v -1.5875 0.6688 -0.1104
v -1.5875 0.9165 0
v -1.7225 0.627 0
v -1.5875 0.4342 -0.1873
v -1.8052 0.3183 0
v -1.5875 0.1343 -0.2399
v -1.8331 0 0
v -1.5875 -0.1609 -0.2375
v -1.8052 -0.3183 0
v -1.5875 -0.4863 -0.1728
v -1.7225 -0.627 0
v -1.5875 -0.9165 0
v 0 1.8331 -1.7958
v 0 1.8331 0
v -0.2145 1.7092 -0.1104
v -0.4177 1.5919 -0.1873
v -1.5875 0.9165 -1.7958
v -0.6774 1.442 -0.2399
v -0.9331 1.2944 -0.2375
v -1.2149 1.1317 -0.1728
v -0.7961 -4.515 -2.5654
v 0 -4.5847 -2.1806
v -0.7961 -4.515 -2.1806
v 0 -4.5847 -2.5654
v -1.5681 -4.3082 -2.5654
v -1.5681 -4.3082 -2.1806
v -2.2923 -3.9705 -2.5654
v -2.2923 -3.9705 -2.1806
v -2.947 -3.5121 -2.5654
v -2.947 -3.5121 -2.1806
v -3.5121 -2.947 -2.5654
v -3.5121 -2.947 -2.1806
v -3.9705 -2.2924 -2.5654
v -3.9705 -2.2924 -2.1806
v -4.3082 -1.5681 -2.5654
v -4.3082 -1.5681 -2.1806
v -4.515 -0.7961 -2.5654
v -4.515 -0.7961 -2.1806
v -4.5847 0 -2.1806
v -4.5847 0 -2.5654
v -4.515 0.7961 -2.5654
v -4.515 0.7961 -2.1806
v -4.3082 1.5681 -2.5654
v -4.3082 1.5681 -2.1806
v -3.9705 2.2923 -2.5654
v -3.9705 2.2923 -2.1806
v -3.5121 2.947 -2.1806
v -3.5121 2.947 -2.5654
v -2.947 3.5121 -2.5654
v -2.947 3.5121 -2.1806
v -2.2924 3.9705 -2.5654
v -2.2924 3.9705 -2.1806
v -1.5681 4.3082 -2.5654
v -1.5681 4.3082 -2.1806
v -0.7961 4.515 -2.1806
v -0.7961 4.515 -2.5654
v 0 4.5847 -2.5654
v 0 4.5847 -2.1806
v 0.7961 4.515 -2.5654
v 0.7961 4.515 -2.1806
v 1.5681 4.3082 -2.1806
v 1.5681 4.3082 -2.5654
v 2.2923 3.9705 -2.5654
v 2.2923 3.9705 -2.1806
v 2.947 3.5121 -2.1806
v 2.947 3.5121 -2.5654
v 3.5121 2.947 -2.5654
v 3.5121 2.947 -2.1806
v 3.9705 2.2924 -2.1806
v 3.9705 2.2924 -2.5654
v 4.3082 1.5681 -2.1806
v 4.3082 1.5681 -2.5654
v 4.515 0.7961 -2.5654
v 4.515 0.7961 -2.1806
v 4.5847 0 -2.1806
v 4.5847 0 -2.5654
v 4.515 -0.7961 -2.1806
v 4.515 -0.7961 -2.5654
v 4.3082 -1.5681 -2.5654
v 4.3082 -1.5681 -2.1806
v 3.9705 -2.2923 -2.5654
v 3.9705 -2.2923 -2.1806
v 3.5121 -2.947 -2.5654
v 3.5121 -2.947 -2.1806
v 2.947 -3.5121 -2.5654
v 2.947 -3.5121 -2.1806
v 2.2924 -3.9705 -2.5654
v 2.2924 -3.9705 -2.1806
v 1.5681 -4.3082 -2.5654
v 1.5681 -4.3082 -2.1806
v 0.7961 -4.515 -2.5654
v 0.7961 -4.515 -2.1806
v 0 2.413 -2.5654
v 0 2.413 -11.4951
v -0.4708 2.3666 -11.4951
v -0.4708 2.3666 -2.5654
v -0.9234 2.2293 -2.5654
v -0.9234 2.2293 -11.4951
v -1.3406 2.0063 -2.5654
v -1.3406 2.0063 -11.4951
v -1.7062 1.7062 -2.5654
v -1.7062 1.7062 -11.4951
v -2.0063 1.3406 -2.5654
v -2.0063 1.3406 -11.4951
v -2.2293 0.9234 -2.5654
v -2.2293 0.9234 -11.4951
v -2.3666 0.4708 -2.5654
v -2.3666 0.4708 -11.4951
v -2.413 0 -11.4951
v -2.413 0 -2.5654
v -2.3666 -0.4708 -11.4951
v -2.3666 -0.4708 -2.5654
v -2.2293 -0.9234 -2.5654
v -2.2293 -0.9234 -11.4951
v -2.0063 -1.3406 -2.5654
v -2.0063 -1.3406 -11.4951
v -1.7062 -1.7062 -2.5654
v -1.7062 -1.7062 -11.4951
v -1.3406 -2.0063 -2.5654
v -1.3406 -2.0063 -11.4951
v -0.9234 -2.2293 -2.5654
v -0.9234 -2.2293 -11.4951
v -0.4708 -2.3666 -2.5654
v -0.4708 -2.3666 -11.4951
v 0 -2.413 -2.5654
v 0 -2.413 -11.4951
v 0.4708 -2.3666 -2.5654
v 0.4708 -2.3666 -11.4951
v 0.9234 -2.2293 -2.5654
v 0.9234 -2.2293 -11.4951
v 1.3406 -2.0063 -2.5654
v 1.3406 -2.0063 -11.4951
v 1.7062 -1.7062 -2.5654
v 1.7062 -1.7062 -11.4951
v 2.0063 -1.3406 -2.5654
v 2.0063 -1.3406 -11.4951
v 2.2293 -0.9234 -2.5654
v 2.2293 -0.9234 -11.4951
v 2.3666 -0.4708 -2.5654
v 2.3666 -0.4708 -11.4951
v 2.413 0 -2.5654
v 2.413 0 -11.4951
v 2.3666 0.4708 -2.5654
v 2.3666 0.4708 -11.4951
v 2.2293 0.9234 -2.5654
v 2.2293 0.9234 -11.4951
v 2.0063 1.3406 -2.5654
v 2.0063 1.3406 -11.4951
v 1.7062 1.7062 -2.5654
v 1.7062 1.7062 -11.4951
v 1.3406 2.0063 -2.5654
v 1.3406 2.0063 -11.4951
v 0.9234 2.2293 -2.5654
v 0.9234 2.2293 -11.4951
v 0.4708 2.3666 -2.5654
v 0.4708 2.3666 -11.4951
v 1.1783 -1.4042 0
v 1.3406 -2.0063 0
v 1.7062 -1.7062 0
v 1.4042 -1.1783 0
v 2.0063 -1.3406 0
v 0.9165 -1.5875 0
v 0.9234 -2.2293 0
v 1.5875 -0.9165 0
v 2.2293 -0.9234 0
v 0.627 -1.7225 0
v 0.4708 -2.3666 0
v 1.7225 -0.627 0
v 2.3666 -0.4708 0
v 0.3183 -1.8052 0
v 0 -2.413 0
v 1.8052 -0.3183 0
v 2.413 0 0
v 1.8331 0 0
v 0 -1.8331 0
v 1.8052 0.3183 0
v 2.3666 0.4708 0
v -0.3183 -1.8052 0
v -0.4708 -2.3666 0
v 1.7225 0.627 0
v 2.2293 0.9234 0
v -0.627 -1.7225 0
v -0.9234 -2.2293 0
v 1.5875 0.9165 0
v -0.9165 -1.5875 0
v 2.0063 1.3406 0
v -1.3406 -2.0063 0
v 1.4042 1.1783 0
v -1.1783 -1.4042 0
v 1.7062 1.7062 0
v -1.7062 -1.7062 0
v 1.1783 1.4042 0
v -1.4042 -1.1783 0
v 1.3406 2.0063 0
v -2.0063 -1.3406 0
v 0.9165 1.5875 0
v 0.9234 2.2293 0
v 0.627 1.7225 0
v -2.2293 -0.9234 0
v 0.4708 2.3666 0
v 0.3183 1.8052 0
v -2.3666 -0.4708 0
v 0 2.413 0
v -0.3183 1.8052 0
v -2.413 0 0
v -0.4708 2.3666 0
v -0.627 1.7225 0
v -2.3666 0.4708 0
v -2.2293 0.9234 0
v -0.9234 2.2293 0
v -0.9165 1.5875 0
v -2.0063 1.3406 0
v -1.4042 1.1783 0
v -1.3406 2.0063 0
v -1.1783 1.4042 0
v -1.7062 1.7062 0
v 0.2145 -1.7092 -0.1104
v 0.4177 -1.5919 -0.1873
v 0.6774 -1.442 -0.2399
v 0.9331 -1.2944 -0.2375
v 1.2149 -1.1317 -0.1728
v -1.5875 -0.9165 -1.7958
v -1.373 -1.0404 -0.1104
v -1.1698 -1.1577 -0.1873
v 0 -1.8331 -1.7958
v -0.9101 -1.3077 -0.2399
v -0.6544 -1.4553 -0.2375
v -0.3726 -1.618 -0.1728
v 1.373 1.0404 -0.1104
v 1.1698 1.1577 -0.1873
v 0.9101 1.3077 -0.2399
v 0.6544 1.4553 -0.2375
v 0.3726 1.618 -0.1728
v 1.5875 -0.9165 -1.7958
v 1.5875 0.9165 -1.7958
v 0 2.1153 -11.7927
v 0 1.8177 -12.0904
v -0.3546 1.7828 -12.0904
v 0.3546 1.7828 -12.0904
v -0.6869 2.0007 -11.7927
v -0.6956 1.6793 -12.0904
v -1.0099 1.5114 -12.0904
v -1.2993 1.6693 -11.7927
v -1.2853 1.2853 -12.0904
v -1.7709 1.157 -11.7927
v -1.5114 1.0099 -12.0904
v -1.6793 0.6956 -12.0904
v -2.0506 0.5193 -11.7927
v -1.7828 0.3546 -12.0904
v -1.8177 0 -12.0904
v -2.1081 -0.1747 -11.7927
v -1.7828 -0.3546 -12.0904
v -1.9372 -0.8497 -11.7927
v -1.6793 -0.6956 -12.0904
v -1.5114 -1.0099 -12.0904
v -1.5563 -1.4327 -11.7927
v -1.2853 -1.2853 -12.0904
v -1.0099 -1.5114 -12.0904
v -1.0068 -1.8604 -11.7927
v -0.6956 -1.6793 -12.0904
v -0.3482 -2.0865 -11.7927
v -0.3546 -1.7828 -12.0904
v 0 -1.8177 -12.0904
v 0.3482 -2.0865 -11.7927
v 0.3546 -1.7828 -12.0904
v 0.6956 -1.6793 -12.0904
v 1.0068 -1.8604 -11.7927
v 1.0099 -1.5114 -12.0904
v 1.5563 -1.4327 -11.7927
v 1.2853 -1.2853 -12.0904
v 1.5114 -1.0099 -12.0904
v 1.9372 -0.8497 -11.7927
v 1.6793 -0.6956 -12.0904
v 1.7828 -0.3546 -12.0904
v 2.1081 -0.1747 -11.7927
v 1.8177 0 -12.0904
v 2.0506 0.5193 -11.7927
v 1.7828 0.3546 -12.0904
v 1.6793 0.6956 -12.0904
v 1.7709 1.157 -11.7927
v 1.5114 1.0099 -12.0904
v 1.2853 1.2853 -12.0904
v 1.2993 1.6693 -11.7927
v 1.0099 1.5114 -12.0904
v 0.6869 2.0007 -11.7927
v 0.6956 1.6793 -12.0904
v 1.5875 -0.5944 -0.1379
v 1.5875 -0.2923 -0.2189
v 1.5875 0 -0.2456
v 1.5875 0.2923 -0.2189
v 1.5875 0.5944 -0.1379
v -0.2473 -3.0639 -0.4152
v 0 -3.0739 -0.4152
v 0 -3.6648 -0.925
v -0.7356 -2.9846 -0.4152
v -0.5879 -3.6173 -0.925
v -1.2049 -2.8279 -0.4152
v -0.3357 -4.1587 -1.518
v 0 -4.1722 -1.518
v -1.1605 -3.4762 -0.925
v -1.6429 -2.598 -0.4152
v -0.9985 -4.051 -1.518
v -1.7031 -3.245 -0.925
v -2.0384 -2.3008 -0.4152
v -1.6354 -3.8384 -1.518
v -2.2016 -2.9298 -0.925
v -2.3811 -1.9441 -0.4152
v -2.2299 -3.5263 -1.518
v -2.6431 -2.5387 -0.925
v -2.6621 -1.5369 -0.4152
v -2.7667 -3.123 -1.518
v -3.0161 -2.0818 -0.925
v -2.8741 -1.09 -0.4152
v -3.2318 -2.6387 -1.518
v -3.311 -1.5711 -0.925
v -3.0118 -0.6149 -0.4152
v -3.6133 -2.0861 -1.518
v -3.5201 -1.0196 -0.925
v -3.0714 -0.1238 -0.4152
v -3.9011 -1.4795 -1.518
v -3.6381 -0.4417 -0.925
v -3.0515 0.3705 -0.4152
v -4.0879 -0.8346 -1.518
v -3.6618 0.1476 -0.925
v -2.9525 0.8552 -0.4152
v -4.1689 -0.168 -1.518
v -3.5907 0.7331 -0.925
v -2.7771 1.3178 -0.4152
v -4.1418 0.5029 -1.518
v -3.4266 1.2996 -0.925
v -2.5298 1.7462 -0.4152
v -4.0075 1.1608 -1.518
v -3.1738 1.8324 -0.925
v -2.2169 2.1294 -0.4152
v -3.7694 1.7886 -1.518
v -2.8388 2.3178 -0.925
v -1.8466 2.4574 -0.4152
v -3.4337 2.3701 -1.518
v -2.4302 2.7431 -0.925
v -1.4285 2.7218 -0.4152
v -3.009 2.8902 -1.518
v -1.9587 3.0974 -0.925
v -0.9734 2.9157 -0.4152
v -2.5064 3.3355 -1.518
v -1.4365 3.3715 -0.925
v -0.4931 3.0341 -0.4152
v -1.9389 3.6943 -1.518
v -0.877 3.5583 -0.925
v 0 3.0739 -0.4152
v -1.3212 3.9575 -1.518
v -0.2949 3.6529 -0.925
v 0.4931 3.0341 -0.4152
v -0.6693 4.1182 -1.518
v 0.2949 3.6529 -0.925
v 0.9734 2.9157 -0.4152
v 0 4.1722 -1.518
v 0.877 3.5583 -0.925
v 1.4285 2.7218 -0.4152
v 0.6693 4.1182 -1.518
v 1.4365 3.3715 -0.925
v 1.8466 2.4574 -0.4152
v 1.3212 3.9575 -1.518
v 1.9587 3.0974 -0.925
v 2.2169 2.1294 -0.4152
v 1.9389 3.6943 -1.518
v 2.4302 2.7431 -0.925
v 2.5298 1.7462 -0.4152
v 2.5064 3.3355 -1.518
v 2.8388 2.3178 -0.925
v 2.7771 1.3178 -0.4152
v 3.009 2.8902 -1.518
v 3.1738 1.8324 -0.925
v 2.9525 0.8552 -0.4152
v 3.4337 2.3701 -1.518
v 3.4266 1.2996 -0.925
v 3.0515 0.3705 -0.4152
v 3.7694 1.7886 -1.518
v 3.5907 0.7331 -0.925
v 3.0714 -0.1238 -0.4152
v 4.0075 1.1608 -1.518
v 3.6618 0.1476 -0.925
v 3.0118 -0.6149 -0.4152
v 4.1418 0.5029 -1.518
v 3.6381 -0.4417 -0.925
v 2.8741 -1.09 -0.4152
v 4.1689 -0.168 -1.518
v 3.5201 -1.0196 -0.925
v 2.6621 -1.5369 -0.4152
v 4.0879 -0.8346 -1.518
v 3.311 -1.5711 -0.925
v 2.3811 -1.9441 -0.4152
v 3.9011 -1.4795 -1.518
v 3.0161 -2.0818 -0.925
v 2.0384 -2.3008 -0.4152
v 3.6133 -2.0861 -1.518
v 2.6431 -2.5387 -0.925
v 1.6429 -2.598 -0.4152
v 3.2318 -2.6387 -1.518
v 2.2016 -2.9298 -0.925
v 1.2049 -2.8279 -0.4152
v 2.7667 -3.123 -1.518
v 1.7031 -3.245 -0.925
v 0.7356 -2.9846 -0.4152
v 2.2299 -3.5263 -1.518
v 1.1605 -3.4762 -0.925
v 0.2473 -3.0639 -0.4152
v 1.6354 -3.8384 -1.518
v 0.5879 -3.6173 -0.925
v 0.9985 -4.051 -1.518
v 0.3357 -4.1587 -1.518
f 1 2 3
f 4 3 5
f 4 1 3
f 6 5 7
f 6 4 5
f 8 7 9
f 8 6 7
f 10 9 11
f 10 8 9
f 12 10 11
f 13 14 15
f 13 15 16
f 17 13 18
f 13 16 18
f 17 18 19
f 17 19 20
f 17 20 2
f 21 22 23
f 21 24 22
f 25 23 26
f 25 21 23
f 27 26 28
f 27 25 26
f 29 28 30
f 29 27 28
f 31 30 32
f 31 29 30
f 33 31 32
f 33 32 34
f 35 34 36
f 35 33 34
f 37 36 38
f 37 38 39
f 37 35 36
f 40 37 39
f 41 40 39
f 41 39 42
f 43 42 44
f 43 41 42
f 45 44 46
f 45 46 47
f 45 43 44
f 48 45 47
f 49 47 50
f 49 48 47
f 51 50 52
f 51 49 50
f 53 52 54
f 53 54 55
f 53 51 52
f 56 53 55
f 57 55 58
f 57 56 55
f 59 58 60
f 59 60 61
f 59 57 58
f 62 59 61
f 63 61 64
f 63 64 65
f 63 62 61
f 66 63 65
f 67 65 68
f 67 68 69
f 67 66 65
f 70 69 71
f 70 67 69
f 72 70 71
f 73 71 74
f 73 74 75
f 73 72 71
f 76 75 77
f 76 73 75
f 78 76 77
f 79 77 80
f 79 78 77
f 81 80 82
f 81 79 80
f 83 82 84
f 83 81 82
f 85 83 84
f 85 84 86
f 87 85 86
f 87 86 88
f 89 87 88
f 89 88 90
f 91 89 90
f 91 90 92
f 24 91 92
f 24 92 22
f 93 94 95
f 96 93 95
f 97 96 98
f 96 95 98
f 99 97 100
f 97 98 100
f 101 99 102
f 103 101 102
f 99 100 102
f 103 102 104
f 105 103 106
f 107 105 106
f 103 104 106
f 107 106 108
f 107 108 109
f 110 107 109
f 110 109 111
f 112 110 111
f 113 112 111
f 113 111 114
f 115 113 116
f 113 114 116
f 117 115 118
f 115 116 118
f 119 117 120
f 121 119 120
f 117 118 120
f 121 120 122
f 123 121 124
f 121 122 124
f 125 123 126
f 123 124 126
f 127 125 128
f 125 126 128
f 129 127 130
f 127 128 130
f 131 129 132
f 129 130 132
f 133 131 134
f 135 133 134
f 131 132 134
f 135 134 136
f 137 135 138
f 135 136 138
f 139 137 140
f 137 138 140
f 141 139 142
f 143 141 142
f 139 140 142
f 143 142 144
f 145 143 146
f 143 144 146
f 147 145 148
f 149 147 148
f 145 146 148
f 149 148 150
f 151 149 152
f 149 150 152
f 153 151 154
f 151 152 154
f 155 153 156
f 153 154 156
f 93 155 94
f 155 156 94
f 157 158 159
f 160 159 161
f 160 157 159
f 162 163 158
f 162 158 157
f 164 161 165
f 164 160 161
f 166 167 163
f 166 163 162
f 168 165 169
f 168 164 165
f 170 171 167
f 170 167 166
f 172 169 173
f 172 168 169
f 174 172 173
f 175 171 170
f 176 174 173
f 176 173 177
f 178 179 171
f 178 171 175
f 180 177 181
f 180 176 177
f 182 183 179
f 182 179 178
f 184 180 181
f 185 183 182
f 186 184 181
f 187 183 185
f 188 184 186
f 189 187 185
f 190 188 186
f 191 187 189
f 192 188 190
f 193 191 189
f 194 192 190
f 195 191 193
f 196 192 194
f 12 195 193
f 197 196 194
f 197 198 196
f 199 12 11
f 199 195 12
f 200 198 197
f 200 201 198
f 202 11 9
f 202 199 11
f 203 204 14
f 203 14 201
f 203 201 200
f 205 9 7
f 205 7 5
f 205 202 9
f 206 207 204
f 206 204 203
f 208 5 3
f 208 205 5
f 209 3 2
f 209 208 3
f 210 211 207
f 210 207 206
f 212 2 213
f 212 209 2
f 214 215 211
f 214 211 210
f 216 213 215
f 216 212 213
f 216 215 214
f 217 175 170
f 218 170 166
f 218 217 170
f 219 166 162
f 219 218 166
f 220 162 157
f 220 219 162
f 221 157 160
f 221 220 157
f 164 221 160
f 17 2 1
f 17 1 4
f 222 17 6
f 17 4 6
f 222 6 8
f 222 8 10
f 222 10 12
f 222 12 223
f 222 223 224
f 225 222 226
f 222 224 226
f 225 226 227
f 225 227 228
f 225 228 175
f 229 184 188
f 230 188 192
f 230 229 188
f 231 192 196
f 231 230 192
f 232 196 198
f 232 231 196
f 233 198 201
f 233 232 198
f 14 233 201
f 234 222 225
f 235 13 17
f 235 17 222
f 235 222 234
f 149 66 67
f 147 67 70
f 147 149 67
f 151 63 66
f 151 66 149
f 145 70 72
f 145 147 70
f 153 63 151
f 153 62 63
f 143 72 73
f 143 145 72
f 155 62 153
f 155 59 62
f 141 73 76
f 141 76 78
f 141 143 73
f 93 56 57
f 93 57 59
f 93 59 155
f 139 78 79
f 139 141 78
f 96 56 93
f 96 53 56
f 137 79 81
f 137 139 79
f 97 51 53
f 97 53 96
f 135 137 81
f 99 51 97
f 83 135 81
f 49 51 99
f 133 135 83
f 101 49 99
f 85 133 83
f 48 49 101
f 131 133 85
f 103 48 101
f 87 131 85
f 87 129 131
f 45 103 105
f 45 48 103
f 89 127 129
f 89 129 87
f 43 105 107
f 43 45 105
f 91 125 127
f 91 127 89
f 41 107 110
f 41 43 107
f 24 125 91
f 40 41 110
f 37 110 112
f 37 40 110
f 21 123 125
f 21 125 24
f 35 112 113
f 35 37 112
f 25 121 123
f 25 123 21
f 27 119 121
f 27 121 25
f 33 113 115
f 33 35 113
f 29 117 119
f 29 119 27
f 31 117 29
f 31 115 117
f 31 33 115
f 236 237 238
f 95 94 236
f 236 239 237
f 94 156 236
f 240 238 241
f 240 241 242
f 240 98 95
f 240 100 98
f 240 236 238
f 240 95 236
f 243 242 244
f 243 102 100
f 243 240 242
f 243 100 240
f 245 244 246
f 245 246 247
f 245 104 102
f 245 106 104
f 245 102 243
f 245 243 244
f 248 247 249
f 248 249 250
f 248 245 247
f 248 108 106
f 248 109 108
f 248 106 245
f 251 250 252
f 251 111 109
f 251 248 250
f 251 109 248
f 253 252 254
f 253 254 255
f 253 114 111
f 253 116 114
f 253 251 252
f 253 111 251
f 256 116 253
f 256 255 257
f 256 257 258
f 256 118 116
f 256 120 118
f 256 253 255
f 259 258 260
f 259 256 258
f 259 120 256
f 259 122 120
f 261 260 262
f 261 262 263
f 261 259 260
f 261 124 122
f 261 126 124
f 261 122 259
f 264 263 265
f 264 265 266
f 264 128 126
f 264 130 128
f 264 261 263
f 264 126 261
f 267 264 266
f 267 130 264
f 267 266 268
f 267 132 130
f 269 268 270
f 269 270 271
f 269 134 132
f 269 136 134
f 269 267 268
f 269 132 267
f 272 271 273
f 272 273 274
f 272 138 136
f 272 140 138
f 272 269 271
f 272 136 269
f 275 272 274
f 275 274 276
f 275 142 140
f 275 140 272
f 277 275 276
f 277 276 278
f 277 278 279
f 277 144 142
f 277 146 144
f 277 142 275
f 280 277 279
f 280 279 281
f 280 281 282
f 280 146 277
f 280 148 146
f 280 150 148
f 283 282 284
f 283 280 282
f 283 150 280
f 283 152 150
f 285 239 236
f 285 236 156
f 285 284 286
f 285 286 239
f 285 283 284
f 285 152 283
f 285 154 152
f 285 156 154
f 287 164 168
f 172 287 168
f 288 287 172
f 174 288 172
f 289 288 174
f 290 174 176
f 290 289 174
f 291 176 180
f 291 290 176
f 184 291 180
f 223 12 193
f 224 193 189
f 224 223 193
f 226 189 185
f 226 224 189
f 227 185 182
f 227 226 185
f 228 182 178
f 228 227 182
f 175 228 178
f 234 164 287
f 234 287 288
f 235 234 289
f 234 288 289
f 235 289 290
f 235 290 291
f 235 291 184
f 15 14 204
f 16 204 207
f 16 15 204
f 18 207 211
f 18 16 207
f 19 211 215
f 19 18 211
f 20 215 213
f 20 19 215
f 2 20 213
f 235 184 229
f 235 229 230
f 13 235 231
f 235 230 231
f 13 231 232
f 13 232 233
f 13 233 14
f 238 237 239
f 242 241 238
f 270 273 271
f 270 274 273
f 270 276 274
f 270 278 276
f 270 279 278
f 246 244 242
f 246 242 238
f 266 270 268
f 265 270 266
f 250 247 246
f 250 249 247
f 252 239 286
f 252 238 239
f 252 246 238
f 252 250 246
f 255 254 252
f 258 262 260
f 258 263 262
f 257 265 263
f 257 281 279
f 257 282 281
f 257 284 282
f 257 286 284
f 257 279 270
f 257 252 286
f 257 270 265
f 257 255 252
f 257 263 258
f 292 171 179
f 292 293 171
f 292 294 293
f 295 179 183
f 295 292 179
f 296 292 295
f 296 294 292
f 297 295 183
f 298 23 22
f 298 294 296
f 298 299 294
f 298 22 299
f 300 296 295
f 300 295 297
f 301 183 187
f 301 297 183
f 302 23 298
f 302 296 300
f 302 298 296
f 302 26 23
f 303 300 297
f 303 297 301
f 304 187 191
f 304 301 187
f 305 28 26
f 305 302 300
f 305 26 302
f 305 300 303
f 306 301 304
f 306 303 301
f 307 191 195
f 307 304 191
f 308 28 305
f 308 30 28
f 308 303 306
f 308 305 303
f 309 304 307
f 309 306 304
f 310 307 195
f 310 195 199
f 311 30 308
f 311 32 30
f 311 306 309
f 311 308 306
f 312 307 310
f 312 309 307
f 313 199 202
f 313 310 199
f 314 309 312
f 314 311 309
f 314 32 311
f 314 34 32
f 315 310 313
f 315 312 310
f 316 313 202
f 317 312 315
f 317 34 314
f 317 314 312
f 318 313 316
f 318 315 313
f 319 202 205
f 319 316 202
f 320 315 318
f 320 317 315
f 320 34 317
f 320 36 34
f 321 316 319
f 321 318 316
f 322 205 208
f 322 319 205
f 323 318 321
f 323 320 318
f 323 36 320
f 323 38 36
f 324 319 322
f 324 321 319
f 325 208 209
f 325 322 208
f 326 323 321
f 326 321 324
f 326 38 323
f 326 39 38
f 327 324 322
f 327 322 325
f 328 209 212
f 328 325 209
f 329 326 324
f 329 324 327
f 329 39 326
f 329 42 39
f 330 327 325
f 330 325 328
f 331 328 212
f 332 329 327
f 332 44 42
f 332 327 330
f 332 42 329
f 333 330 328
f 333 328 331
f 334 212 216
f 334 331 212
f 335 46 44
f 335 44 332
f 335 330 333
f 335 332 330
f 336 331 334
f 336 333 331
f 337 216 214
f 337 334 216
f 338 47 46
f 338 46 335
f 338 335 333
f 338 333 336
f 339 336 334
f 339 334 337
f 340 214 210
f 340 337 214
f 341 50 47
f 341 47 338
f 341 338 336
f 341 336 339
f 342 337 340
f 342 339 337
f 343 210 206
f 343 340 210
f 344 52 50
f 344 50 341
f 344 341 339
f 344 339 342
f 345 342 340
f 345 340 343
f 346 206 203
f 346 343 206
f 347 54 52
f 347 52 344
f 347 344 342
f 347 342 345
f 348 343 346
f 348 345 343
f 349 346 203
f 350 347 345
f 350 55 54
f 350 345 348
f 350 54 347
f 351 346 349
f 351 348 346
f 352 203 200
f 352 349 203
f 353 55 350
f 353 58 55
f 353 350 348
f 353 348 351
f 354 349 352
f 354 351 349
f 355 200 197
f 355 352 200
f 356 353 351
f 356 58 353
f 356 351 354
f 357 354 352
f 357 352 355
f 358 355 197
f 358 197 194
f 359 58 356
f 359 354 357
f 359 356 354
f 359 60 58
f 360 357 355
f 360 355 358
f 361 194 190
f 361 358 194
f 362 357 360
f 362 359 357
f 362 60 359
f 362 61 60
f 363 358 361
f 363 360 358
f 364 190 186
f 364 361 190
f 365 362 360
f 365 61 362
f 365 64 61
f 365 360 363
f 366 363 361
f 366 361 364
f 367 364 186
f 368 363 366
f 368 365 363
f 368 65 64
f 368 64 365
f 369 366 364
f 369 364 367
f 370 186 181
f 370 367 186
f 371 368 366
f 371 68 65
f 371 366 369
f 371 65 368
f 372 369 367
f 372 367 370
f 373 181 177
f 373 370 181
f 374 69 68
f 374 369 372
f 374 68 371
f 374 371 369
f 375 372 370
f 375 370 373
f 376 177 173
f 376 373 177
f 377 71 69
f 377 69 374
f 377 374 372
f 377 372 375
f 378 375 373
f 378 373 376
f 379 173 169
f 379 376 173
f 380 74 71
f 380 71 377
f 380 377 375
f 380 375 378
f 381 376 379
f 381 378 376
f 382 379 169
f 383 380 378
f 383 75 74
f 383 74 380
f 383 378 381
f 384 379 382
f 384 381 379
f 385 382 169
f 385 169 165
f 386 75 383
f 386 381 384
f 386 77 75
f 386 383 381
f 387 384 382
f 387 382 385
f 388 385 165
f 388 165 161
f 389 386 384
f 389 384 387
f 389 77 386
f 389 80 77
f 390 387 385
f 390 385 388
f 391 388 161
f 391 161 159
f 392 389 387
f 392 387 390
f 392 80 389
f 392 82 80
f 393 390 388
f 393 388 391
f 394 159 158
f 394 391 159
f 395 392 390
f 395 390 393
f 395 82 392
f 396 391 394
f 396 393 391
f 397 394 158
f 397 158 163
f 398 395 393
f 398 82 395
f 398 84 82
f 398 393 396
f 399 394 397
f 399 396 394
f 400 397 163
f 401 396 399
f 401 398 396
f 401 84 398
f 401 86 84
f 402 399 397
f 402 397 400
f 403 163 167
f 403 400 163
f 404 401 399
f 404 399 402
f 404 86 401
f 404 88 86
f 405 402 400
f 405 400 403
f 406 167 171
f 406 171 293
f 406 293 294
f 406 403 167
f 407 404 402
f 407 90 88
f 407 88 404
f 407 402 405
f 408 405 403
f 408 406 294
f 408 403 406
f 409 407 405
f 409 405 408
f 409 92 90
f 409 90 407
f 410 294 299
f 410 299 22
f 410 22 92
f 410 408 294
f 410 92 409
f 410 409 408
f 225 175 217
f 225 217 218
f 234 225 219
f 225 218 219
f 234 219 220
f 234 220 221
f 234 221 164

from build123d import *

# Parameters (mm, degrees)
SKETCH1_W          = 9.525
SKETCH1_H          = 2.413
CHAMFER1_SIZE      = 0.5953125
CUT_EXTRUDE2_DEPTH = 1.79578
SKETCH6_R          = 1.833087105
CUT_EXTRUDE3_DEPTH = 1.79578
CUT_EXTRUDE3_TAPER = 45


with BuildPart() as part:
    # Sketch1 → Revolve1 (revolve)
    with BuildSketch(Plane(origin=(0, 0, 0), x_dir=(0, 0, -1), z_dir=(1, 0, 0))):
        with Locations((7.3279, 1.2065)):
            Rectangle(SKETCH1_W, SKETCH1_H)
    revolve(axis=Axis((0, 0, -12.0904), (0, 0, 1)))

    # Chamfer1
    chamfer1_edges = [part.edges().sort_by_distance(p)[0] for p in [
        (0, -2.413, -12.0904),
    ]]
    chamfer(chamfer1_edges, length=CHAMFER1_SIZE)

    # Sketch7 → Revolve2 (revolve)
    with BuildSketch(Plane(origin=(0, 0, 0), x_dir=(0, 0, -1), z_dir=(1, 0, 0))):
        with BuildLine():
            Line((2.18059, 4.5847), (2.5654, 4.5847))
            Line((2.5654, 4.5847), (2.5654, 0))
            Line((2.5654, 0), (0, 0))
            Line((0, 0), (0, 2.413))
            ThreePointArc((0, 2.413), (0.925030326, 3.664791196), (2.18059, 4.5847))
        make_face()
    revolve(axis=Axis((0, 0, 0), (0, 0, -1)))

    # Sketch5 → Cut-Extrude2 (cut)
    with BuildSketch(Plane.XY):
        Polygon((1.5875, -0.916543552), (1.5875, 0.916543552), (0, 1.833087105), (-1.5875, 0.916543552), (-1.5875, -0.916543552), (0, -1.833087105), align=None)
    extrude(amount=-CUT_EXTRUDE2_DEPTH, mode=Mode.SUBTRACT)

    # Sketch6 → Cut-Extrude3 (cut)
    with BuildSketch(Plane.XY):
        Circle(SKETCH6_R)
    extrude(amount=-CUT_EXTRUDE3_DEPTH, taper=CUT_EXTRUDE3_TAPER, mode=Mode.SUBTRACT)


solid = part.part
